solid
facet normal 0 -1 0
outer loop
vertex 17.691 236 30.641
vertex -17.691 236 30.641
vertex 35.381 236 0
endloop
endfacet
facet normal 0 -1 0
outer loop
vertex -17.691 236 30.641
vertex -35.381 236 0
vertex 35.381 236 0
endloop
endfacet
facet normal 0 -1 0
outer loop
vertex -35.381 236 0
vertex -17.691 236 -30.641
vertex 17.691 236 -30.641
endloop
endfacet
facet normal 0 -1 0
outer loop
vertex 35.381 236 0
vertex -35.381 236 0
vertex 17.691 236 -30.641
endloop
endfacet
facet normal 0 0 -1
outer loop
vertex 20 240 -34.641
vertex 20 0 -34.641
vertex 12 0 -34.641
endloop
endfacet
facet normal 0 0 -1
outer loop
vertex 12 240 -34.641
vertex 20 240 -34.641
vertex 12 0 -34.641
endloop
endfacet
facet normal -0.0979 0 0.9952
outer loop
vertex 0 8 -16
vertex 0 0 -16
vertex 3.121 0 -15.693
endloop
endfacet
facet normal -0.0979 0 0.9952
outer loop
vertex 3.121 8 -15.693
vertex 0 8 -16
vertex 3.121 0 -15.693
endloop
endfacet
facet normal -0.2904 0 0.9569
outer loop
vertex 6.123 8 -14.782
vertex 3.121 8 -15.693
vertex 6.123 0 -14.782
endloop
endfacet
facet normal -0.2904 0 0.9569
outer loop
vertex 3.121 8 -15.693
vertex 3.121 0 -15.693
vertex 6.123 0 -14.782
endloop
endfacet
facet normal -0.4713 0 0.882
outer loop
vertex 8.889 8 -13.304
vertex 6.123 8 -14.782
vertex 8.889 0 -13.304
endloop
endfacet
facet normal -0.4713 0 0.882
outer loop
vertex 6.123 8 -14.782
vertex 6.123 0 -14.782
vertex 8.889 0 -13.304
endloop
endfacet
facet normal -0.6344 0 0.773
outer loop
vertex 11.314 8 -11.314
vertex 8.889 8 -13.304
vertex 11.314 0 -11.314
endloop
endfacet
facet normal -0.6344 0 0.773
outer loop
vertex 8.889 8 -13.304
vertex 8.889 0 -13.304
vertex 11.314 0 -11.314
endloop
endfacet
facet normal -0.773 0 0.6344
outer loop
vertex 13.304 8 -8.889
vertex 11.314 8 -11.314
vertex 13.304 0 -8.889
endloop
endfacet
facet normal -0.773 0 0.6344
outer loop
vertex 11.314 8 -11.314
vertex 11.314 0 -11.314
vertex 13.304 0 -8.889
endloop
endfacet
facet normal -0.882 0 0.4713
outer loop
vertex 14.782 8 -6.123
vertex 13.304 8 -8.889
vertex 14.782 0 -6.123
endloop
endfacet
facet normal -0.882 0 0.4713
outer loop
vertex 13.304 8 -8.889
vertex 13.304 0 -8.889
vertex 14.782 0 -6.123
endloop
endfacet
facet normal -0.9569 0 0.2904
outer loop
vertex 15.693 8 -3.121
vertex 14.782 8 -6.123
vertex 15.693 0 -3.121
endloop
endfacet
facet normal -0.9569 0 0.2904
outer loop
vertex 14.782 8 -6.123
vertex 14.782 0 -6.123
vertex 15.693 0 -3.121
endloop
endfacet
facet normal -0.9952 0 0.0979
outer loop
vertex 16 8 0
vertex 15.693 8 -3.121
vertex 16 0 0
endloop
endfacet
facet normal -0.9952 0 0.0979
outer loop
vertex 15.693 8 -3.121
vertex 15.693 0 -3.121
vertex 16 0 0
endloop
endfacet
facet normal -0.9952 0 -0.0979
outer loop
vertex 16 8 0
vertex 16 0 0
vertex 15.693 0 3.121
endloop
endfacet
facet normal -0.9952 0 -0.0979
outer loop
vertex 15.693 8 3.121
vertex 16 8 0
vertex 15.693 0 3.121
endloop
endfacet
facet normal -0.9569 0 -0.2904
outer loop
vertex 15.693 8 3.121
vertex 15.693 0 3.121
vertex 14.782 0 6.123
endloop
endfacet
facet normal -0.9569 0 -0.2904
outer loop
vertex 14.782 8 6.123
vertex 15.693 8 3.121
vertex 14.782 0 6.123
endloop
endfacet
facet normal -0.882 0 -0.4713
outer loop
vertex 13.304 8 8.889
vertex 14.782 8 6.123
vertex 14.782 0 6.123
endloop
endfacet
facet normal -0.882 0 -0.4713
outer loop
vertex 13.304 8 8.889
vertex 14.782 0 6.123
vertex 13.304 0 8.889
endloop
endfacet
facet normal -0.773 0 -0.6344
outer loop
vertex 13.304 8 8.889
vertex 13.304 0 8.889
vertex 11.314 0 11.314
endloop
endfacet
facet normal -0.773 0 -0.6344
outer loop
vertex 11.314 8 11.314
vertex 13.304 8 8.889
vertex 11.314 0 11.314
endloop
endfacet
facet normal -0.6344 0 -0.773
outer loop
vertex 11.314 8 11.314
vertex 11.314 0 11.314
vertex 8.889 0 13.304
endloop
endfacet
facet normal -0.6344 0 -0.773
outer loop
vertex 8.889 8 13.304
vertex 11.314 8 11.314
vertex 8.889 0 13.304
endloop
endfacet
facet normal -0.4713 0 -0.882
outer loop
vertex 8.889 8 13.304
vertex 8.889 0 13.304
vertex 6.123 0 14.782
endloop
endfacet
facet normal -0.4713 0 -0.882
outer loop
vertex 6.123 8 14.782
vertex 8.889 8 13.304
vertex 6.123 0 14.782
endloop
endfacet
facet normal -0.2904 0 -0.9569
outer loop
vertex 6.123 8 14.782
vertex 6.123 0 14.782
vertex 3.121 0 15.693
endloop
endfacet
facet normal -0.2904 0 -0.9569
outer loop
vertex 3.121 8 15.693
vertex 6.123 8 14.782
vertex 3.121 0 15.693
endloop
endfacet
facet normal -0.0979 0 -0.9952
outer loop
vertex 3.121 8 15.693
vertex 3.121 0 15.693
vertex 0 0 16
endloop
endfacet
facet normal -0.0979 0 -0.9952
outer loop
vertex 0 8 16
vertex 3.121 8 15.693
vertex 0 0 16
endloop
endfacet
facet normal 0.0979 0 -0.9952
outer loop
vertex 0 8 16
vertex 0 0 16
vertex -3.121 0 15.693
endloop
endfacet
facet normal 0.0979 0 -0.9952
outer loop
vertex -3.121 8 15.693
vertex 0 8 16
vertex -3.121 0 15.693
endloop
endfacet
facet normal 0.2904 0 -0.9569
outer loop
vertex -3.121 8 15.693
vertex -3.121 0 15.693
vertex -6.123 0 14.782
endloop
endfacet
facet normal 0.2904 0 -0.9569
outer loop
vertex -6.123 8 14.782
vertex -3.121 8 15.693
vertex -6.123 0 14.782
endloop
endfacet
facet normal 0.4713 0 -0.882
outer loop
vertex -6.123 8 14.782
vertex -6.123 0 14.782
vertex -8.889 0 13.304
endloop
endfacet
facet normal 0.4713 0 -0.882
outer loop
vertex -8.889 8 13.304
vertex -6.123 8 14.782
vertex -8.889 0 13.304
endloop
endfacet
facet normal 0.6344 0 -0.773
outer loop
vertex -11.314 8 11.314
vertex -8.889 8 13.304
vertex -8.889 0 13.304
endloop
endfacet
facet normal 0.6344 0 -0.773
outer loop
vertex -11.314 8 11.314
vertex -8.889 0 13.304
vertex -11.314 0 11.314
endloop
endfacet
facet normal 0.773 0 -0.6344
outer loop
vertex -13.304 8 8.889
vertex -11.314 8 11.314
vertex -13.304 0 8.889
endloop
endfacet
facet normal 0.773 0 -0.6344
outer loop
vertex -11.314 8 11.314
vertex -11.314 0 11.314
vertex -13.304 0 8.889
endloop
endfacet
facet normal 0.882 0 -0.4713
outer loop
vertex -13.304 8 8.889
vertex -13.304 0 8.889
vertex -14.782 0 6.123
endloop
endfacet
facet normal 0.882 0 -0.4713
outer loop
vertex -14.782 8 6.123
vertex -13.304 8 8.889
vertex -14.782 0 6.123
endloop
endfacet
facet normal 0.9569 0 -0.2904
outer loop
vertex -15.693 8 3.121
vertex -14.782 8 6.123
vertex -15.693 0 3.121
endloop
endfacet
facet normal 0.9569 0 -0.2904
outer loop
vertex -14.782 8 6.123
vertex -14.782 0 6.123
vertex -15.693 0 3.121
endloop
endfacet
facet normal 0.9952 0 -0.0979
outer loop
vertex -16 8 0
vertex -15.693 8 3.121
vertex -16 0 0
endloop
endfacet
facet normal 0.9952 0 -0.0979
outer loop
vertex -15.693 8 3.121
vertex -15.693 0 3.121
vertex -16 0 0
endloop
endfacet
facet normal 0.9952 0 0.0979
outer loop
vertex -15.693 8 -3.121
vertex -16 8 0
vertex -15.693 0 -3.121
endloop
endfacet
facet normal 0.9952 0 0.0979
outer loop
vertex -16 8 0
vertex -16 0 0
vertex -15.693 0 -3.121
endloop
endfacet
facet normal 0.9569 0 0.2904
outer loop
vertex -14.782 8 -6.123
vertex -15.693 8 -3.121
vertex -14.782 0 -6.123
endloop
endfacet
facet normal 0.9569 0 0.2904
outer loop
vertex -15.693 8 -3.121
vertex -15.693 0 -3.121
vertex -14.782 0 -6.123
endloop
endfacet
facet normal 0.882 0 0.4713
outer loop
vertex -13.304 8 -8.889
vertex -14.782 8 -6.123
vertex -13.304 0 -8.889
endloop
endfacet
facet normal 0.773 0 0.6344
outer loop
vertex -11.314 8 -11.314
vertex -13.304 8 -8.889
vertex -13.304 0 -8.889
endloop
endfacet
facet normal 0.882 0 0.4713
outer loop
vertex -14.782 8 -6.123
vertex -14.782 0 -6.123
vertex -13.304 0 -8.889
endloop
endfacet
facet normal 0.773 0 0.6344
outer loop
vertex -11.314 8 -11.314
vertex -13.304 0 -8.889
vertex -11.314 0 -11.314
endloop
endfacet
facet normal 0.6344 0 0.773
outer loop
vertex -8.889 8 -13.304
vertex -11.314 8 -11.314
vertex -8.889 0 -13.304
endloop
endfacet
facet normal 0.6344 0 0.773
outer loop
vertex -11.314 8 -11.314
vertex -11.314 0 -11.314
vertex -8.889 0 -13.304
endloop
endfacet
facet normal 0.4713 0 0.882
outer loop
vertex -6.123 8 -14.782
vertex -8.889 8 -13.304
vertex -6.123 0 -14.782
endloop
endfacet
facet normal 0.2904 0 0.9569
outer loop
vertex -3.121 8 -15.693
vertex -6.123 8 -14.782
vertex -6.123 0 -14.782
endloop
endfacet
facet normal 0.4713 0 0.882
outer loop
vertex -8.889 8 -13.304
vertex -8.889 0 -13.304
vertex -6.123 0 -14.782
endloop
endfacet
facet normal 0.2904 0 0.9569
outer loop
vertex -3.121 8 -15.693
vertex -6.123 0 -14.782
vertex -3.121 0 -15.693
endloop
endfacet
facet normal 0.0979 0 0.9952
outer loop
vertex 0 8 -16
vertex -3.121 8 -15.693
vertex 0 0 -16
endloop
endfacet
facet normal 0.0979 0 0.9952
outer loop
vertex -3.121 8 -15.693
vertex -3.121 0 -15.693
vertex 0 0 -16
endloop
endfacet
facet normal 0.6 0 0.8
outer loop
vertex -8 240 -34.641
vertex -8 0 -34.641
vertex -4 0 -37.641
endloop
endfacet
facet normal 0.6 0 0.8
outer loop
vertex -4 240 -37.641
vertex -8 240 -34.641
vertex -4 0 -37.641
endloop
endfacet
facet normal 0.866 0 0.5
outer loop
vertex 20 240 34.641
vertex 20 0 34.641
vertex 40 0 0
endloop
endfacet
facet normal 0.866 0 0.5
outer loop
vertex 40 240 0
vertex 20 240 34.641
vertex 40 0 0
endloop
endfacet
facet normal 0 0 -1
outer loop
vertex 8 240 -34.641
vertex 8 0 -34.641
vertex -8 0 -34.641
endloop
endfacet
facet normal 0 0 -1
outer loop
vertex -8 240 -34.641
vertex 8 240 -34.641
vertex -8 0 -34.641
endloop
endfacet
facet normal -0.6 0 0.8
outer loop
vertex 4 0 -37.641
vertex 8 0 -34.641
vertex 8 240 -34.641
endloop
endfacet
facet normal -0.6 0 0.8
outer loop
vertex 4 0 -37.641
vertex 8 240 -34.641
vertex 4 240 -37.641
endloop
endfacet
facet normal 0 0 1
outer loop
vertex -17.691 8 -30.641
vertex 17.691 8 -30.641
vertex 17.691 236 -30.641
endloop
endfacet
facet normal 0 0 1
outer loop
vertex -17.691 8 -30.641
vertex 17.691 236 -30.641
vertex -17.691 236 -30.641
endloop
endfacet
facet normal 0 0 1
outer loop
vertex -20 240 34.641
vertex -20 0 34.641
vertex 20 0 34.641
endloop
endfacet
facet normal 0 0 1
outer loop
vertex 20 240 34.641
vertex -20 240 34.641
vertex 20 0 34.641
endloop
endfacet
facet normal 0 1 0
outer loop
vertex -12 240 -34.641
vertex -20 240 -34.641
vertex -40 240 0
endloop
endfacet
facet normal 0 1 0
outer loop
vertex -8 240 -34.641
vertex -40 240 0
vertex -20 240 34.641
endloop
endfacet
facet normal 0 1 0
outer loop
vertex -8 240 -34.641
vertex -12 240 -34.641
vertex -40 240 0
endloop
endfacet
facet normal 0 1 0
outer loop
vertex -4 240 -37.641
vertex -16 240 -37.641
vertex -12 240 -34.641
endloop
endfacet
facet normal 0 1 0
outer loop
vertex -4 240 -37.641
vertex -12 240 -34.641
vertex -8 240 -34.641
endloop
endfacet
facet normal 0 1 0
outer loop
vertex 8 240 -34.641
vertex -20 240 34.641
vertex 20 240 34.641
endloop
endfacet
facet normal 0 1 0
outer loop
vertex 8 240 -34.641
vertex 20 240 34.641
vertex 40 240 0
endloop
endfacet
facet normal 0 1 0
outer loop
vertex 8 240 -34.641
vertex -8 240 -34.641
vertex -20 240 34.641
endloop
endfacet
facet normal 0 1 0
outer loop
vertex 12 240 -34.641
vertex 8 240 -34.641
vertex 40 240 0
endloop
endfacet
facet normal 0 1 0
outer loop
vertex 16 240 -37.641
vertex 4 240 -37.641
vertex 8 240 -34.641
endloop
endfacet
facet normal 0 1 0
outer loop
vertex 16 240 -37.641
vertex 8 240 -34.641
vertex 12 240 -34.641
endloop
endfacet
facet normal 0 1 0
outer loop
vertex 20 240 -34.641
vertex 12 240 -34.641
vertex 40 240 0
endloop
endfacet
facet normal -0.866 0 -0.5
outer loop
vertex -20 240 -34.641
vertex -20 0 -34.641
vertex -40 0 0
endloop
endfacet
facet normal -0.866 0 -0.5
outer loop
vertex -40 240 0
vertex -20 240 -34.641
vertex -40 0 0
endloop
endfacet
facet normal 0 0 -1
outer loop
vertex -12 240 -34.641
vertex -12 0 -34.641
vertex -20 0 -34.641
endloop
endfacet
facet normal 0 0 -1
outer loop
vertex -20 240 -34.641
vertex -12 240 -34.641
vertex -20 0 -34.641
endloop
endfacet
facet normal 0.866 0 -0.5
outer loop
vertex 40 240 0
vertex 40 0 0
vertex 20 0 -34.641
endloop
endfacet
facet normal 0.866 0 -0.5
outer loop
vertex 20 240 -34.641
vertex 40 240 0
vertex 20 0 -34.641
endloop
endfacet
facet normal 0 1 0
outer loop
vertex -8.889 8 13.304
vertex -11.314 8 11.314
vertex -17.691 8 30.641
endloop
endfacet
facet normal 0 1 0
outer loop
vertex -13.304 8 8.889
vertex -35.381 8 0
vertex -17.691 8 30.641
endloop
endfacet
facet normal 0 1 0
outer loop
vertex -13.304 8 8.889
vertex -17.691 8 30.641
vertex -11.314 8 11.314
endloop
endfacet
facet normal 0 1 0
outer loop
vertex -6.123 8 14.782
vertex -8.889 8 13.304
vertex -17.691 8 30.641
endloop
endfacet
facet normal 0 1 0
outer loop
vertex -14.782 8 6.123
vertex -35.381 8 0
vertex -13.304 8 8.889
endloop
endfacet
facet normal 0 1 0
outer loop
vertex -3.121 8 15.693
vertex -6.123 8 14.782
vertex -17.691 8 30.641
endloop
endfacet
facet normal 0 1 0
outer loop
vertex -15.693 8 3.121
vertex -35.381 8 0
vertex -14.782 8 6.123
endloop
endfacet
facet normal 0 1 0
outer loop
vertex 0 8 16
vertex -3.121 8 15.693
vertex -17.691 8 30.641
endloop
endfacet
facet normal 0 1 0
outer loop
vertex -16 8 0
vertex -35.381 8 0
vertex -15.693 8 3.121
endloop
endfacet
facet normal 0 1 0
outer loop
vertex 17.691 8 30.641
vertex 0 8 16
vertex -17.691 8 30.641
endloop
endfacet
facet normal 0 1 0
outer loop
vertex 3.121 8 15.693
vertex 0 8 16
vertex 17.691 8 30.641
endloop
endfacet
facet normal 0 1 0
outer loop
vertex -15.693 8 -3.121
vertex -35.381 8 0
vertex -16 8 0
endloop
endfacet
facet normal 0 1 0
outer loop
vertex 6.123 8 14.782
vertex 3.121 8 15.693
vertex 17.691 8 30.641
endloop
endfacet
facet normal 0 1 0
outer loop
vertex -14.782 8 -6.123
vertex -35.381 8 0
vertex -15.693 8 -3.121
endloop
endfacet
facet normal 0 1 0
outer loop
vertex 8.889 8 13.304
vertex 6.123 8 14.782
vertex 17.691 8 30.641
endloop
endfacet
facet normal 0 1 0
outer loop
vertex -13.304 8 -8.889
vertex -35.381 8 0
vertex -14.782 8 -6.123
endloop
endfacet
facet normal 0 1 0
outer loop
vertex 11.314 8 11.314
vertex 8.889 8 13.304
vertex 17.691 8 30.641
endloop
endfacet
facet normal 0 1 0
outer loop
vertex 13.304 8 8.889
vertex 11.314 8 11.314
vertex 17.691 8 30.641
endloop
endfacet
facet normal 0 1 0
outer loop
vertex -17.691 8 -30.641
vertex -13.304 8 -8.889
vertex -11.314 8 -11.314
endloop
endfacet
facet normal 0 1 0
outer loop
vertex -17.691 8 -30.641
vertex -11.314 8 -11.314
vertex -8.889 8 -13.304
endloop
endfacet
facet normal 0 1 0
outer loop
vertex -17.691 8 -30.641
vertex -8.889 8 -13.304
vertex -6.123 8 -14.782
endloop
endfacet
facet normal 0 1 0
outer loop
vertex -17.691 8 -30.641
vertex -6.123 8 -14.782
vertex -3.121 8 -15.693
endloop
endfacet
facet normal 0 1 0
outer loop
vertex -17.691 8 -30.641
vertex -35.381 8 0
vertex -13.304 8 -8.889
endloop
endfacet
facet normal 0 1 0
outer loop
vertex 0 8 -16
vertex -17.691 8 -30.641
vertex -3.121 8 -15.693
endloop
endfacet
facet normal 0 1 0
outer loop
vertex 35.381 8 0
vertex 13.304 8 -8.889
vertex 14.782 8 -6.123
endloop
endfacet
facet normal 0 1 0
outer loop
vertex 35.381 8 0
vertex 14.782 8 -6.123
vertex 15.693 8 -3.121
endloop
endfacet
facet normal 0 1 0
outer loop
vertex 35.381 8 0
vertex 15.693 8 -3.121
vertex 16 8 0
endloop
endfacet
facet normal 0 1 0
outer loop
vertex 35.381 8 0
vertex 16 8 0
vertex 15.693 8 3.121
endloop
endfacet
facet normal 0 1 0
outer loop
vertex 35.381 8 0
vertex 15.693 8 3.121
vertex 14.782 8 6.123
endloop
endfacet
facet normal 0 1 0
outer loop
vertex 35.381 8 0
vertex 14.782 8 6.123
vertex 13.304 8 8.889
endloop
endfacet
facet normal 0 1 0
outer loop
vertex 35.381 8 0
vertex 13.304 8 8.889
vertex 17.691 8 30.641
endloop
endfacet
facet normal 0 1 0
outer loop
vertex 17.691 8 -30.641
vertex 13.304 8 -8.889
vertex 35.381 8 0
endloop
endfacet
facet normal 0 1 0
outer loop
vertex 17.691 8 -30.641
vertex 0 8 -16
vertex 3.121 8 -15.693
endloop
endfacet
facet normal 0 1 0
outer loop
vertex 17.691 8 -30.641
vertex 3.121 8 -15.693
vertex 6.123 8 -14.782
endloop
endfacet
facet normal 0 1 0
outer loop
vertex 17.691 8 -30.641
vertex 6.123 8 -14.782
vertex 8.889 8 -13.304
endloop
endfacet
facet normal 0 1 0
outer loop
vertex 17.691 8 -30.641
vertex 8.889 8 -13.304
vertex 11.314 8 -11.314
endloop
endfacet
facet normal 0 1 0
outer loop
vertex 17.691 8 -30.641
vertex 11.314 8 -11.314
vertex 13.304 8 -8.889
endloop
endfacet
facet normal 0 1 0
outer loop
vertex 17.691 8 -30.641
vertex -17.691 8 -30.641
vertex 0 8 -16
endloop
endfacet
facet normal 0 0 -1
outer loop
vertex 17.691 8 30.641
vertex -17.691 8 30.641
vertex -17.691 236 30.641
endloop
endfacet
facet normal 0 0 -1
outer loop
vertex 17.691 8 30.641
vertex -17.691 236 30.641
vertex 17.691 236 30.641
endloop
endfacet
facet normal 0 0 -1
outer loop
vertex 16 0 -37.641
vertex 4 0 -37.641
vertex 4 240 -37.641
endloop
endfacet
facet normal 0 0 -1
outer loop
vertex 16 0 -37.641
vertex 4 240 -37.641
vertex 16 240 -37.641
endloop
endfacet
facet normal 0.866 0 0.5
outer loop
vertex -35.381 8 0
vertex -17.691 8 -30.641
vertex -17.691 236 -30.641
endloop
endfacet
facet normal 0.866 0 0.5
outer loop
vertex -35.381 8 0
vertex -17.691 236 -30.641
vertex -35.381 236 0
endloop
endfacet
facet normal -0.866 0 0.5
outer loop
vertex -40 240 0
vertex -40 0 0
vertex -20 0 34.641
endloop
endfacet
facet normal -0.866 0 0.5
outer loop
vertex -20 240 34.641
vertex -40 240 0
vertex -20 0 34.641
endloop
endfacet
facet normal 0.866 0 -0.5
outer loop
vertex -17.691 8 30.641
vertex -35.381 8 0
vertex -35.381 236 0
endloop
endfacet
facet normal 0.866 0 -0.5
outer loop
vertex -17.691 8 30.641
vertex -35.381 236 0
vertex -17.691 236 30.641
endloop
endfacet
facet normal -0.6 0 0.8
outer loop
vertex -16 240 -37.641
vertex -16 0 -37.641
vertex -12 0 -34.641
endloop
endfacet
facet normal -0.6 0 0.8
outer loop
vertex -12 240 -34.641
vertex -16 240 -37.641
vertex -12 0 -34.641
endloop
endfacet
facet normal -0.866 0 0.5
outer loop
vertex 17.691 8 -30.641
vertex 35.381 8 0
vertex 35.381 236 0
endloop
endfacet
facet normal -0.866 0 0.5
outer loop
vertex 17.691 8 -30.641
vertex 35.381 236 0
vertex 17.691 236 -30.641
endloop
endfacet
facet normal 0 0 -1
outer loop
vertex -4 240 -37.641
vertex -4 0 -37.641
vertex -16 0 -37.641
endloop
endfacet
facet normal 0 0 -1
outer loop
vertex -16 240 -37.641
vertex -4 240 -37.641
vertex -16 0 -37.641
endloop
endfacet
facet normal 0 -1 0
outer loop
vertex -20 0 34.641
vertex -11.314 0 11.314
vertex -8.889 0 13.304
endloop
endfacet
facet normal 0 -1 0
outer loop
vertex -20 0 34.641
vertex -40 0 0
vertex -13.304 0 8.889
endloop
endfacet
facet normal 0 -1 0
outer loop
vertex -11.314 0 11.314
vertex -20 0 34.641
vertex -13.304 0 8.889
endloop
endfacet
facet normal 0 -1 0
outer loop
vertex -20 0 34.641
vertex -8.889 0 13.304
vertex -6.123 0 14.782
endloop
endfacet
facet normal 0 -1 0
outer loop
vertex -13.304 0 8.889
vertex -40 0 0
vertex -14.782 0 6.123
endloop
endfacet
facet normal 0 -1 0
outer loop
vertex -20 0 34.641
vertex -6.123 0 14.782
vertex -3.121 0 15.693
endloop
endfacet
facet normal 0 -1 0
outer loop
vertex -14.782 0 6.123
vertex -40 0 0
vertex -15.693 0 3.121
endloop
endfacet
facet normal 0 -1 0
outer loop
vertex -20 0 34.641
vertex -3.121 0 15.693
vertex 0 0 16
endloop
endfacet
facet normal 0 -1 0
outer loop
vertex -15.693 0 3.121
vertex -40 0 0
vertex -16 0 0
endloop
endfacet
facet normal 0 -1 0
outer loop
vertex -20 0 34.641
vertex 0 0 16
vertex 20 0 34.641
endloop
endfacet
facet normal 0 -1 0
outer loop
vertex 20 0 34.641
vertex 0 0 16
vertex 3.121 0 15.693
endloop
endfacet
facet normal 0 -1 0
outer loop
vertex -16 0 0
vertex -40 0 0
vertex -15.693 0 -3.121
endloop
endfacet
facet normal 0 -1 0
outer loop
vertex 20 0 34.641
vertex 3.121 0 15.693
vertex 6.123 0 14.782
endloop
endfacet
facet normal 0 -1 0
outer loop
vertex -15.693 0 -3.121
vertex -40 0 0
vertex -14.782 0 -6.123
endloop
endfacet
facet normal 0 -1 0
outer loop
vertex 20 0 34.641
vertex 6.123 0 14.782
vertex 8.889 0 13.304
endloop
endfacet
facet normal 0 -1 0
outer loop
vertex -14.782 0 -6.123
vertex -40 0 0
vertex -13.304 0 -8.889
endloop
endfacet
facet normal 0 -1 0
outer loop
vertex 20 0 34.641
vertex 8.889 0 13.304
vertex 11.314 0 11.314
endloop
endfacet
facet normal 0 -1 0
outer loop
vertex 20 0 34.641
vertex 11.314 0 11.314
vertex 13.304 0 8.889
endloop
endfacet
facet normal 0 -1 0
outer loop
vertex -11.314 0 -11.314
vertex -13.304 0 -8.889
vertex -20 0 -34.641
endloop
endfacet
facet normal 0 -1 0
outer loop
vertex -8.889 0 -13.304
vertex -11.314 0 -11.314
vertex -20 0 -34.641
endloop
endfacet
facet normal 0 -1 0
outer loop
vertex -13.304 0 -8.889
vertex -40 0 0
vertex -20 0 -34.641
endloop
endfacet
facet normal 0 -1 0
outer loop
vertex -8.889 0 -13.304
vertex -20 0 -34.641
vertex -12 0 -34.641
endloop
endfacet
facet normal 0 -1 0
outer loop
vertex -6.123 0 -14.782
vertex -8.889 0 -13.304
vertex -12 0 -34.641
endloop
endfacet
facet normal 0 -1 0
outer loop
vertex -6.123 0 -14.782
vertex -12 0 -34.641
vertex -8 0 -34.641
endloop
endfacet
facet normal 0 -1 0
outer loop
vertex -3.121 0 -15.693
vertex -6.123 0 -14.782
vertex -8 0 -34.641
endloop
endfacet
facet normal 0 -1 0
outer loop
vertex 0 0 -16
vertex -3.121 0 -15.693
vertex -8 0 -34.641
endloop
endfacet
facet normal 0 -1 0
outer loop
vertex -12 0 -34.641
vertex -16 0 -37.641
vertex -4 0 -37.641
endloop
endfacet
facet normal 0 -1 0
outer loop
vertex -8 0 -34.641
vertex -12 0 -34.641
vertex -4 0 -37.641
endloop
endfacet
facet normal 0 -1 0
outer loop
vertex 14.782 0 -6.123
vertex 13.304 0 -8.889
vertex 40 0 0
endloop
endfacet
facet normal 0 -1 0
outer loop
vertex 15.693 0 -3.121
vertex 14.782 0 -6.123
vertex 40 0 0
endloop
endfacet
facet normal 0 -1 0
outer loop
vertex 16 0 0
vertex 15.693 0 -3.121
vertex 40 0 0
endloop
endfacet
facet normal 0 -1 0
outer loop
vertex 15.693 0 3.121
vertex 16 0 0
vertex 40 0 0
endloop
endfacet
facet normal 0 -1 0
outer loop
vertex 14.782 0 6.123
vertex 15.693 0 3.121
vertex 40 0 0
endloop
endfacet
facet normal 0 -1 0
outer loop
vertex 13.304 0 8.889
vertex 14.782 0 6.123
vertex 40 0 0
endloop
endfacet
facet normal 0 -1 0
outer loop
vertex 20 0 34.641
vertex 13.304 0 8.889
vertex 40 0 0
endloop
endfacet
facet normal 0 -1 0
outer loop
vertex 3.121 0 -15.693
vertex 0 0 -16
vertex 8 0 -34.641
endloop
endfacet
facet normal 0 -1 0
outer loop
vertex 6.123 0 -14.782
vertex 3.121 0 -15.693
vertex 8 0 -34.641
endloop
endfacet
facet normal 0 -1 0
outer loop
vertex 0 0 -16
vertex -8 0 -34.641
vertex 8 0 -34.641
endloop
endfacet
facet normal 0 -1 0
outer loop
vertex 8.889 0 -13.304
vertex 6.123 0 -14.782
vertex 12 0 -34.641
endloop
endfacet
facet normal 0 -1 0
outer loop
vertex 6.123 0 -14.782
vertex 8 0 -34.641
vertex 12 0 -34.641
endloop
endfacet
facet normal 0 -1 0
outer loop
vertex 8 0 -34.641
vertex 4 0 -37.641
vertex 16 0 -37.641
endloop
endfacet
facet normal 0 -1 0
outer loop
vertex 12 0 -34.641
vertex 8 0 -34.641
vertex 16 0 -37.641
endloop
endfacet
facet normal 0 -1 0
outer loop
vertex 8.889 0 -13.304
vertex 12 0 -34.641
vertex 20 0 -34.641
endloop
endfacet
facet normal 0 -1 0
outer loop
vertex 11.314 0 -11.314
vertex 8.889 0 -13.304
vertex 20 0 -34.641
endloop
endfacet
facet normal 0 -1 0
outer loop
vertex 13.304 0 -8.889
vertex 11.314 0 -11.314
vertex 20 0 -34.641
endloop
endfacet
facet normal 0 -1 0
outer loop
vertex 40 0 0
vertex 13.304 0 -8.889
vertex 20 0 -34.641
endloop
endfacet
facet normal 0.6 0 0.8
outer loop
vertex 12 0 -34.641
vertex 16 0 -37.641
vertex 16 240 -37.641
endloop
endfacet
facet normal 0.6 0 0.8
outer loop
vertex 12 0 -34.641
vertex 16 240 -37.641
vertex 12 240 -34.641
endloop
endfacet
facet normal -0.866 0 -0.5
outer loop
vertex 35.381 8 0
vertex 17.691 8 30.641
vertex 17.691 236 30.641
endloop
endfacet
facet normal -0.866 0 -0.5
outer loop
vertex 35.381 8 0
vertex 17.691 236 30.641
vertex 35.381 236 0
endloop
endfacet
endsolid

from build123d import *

# Parameters (mm, degrees)
BOSS_EXTRUDE1_DEPTH = 240
SHELL1_START        = 8
SHELL1_DEPTH        = 228
CUT_EXTRUDE1_REACH  = 248.205
SKETCH2_R           = 16


# Read off the part's stored shape, not the designer's step: Shell1
with BuildPart() as part:
    # Sketch1 → Boss-Extrude1 (new body)
    with BuildSketch(Plane(origin=(0, 0, 0), x_dir=(1, 0, 0), z_dir=(0, 1, 0))):
        Polygon((40, 0), (20, 34.641016151), (-20, 34.641016151), (-40, 0), (-20, -34.641016151), (20, -34.641016151), align=None)
        Polygon((-12, 34.641016151), (-8, 34.641016151), (-4, 37.641016151), (-16, 37.641016151), align=None)
        Polygon((4, 37.641016151), (16, 37.641016151), (12, 34.641016151), (8, 34.641016151), align=None)
    extrude(amount=BOSS_EXTRUDE1_DEPTH)

    # Shell1 outline → Shell1 (cut)
    with BuildSketch(Plane(origin=(0, 0, 0), x_dir=(1, 0, 0), z_dir=(0, 1, 0)).offset(SHELL1_START)):
        Polygon((-17.690598923, -30.641016151), (17.690598923, -30.641016151), (35.381197846, 0), (17.690598923, 30.641016151), (-17.690598923, 30.641016151), (-35.381197846, 0), align=None)
    extrude(amount=SHELL1_DEPTH, mode=Mode.SUBTRACT)

    # Sketch2 → Cut-Extrude1 (cut, up to next)
    with BuildSketch(Plane.XZ, mode=Mode.PRIVATE) as cut_extrude1_sk1:
        with Locations(Location((0, 0, 0), (0, 0, 270))):
            Circle(SKETCH2_R)
    cut_extrude1_tool1 = extrude(cut_extrude1_sk1.sketch, amount=-CUT_EXTRUDE1_REACH, mode=Mode.PRIVATE) & part.part
    add(cut_extrude1_tool1.solids().sort_by_distance((0, 0, 0))[0], mode=Mode.SUBTRACT)


solid = part.part
